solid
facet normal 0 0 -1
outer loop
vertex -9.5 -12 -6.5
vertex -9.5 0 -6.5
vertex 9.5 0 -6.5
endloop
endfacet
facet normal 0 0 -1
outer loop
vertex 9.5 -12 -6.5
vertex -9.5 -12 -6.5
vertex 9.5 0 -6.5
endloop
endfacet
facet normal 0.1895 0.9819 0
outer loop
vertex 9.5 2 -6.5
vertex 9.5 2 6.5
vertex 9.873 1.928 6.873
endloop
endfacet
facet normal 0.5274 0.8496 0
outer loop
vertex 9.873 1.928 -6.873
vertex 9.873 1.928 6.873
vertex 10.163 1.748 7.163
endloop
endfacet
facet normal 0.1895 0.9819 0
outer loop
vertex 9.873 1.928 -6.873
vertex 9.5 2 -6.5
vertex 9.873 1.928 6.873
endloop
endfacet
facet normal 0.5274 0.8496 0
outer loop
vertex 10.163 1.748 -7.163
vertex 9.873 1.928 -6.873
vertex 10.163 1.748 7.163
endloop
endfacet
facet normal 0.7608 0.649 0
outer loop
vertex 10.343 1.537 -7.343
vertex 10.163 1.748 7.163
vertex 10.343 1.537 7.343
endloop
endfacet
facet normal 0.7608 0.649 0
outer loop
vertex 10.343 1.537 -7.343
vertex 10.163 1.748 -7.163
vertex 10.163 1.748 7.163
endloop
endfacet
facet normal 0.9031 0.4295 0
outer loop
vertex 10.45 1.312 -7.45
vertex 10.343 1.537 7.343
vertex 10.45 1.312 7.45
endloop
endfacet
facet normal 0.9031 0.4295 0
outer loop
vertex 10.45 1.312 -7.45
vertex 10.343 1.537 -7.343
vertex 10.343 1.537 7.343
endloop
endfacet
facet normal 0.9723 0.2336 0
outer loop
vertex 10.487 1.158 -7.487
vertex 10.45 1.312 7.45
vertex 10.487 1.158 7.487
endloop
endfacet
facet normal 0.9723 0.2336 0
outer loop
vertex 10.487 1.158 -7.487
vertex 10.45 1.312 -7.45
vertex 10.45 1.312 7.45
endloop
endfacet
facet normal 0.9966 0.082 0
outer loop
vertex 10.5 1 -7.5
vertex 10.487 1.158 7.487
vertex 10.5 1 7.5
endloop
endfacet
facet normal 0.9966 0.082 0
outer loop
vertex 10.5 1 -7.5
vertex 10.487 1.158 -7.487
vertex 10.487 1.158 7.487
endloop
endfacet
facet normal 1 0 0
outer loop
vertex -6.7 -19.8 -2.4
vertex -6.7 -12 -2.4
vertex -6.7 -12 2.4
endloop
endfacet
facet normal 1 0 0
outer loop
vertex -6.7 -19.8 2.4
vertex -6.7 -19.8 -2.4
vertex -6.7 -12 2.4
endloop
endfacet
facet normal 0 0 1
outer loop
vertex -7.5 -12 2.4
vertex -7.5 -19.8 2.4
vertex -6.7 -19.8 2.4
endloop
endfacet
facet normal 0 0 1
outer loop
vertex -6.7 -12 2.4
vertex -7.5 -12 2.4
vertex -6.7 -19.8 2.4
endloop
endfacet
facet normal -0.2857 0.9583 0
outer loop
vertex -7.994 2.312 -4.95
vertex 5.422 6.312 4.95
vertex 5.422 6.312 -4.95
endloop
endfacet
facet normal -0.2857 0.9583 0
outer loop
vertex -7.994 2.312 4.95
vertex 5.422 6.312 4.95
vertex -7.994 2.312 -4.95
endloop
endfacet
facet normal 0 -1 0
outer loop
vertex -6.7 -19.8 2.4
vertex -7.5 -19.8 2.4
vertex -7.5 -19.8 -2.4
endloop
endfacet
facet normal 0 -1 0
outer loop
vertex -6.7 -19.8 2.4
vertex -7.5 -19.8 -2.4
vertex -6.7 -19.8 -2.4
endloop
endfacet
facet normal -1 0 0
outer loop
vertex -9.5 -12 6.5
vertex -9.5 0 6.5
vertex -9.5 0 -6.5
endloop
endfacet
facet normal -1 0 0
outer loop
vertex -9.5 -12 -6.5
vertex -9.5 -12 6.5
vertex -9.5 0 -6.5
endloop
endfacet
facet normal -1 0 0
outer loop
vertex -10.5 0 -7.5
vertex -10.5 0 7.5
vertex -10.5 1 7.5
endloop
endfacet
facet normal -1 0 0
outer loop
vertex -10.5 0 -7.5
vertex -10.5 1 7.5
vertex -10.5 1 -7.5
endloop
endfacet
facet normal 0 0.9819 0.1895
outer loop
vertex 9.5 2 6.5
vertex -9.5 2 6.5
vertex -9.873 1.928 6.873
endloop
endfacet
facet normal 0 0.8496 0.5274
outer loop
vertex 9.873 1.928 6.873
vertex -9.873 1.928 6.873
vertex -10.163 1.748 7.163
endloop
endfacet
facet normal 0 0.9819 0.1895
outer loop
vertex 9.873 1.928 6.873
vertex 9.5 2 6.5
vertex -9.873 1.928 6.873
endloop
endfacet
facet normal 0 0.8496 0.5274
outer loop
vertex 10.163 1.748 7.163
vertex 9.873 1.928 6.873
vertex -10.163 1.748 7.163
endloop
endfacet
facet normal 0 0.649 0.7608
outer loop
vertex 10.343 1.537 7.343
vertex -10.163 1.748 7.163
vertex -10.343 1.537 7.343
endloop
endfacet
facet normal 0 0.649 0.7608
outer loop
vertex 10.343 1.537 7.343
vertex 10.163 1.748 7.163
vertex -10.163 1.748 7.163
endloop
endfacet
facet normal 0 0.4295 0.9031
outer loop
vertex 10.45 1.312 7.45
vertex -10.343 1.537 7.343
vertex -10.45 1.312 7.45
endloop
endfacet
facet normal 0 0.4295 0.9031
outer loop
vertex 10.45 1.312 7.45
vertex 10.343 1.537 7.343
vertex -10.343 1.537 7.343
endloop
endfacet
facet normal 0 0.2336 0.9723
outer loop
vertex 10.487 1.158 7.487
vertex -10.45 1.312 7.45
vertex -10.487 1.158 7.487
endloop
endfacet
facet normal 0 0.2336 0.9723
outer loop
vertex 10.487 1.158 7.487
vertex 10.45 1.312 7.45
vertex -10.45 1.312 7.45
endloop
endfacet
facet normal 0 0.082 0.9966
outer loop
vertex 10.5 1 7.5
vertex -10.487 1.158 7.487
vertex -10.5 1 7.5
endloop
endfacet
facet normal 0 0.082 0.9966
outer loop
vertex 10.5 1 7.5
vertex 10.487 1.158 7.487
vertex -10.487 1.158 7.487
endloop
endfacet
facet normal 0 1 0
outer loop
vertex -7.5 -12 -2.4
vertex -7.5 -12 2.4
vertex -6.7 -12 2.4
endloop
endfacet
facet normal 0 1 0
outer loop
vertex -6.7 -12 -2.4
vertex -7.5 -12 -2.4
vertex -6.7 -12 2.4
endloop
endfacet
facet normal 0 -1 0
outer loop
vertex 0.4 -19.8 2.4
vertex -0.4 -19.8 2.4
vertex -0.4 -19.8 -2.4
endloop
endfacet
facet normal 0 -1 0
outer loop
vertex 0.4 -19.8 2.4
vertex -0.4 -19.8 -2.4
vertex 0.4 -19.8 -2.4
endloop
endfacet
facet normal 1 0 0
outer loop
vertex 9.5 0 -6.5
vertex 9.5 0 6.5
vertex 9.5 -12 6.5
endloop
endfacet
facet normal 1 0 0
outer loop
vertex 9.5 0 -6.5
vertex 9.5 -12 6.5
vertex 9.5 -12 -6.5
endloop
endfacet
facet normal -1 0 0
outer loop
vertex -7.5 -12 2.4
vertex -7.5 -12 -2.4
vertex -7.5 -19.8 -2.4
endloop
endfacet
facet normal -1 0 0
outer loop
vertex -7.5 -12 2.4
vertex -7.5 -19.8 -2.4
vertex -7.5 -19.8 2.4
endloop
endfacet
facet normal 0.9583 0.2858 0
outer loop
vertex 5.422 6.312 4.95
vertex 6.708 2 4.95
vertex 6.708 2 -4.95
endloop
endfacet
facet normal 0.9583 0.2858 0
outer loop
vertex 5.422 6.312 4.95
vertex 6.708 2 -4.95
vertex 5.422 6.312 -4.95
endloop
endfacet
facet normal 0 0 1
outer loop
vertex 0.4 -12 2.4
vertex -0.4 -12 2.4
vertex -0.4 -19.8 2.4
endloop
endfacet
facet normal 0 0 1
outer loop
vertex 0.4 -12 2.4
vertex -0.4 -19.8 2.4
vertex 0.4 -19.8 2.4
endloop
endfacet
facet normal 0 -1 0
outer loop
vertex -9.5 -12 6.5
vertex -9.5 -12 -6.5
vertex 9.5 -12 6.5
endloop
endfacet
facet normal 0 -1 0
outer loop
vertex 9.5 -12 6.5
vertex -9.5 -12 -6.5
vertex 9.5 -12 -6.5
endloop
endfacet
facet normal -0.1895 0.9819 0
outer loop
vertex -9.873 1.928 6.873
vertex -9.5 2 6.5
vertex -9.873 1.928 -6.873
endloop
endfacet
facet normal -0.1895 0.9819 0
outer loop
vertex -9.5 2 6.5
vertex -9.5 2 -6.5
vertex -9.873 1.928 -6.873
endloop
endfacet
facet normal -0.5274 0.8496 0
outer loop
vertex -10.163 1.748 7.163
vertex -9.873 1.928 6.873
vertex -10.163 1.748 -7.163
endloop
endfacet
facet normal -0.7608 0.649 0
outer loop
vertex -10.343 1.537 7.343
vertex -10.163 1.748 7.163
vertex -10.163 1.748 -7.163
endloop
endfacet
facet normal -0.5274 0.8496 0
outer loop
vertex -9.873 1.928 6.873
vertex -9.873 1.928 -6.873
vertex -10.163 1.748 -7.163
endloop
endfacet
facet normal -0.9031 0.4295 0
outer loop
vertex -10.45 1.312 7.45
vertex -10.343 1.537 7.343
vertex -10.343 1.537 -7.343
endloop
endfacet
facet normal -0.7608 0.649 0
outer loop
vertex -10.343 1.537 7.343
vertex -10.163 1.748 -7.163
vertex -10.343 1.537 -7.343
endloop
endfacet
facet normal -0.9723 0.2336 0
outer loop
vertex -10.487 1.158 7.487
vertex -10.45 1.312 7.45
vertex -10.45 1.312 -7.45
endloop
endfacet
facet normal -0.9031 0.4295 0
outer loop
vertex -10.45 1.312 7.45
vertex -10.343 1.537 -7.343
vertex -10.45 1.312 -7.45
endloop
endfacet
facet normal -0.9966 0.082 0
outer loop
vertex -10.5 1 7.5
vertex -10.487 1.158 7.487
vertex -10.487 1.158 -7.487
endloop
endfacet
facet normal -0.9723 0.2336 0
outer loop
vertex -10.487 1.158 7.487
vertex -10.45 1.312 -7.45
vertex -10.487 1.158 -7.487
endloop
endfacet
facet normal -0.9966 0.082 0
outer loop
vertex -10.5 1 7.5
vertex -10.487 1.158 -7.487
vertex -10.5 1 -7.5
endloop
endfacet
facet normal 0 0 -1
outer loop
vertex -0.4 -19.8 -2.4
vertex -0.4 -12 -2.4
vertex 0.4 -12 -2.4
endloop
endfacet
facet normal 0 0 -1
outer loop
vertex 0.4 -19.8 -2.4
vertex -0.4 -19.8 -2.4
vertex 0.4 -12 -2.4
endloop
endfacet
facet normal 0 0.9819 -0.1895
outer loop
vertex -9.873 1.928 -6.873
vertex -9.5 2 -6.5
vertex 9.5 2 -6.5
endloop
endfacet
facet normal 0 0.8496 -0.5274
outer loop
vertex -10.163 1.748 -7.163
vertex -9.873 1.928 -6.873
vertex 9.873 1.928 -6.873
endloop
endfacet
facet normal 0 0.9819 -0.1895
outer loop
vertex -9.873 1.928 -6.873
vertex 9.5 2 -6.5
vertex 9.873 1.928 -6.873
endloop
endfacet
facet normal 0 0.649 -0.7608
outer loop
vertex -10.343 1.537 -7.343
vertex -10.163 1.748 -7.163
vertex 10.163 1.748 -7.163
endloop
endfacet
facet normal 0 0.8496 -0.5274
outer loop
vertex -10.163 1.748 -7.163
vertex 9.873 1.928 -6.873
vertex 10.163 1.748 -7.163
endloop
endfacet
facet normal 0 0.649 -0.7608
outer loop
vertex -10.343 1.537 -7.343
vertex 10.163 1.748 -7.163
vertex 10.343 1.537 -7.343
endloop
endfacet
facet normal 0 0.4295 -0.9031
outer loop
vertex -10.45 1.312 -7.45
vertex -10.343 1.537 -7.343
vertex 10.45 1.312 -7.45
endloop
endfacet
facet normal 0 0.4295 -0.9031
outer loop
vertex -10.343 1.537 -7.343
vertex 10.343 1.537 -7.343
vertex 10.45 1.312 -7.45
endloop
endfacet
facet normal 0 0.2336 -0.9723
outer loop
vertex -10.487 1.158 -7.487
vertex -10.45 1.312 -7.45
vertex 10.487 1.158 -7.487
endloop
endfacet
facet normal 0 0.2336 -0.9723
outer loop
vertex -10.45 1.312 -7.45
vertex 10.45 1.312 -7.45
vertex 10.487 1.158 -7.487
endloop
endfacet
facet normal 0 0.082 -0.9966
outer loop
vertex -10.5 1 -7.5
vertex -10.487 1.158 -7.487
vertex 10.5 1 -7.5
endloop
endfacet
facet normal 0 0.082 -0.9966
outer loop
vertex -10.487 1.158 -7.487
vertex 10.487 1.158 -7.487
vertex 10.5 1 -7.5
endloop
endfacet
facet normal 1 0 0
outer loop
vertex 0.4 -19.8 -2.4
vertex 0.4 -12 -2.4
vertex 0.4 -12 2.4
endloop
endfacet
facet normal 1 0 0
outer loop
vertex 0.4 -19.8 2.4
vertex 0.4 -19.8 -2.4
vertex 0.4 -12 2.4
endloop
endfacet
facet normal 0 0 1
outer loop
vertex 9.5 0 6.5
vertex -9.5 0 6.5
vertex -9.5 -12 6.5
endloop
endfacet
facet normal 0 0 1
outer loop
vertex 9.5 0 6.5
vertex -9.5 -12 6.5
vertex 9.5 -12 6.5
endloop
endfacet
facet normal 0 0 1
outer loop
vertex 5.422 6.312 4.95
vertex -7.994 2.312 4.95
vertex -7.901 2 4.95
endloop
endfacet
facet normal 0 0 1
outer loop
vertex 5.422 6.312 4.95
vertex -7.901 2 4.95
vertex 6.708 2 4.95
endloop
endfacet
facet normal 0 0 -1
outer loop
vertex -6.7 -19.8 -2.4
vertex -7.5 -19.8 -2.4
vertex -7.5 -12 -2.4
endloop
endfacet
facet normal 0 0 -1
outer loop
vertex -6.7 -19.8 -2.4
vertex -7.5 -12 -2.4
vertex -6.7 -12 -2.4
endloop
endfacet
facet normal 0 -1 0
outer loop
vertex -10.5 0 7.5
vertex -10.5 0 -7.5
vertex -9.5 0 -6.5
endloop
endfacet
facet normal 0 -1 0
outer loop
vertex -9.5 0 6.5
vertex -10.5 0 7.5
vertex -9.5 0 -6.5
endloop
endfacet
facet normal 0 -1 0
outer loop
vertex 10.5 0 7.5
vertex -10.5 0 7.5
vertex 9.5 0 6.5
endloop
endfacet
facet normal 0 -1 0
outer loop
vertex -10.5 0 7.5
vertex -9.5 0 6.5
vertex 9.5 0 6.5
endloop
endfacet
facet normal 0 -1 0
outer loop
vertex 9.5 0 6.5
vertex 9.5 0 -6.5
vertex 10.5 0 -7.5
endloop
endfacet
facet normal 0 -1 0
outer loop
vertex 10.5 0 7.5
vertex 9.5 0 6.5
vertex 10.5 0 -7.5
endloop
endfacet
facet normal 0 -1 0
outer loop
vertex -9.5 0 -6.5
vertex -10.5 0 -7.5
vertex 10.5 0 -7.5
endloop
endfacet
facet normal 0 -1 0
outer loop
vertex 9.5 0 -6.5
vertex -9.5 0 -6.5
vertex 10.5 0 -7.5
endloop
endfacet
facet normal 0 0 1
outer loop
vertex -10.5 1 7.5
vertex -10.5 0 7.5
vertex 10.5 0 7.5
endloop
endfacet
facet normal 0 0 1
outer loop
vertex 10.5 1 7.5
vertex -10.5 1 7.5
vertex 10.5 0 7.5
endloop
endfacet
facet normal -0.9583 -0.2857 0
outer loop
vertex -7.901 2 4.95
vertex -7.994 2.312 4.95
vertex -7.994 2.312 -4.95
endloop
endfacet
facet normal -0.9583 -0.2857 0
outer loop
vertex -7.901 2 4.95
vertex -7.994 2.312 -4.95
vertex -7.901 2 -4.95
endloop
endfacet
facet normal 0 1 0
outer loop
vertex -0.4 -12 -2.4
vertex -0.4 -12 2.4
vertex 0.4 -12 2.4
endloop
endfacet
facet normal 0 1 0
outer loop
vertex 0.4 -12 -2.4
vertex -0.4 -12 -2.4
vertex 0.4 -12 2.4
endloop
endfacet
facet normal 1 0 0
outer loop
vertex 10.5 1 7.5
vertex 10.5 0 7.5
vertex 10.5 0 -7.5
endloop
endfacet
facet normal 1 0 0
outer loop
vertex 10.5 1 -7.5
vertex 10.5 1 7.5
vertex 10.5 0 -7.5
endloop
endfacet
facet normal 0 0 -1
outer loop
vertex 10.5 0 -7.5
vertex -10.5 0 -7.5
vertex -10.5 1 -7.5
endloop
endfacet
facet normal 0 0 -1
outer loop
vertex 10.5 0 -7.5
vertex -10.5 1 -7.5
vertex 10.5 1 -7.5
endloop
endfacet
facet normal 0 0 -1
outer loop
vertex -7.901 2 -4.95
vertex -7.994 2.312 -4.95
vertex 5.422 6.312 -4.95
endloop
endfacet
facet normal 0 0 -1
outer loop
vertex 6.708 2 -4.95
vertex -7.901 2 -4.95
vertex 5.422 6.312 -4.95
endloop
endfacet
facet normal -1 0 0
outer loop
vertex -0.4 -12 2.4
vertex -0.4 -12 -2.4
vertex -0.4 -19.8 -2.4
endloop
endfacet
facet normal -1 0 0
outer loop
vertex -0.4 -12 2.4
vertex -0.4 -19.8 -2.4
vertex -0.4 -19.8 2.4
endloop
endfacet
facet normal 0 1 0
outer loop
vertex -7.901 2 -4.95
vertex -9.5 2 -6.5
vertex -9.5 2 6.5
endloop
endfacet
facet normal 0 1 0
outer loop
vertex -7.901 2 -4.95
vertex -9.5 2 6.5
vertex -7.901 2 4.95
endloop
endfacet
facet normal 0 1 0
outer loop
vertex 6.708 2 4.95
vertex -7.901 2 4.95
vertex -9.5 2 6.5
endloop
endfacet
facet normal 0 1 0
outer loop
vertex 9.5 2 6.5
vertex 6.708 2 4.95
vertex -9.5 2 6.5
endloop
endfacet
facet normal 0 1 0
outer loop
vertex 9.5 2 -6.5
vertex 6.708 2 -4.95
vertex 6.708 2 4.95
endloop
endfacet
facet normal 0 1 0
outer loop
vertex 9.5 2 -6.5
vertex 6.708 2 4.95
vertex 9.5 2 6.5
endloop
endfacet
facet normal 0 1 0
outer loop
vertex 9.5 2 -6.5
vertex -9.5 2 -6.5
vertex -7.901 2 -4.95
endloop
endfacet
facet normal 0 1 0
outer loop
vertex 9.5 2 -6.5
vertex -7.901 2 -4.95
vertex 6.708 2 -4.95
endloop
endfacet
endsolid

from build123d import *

# Parameters (mm, degrees)
ESQUISSE1_W          = 21
ESQUISSE1_H          = 15
BOSS_EXTRU_1_DEPTH   = 2
ESQUISSE2_W          = 19
ESQUISSE2_H          = 13
BOSS_EXTRU_2_DEPTH   = 14
ESQUISSE3_W          = 0.8
ESQUISSE3_H          = 4.8
BOSS_EXTRU_3_DEPTH   = 7.8
BOSS_EXTRU_3_2_DEPTH = 7.8
CONG_1_R             = 1
BOSS_EXTRU_4_DEPTH   = 4.95


with BuildPart() as part:
    # Esquisse1 → Boss.-Extru.1 (new body)
    with BuildSketch(Plane(origin=(0, 0, 0), x_dir=(1, 0, 0), z_dir=(0, 1, 0))):
        Rectangle(ESQUISSE1_W, ESQUISSE1_H)
    extrude(amount=BOSS_EXTRU_1_DEPTH)

    # Esquisse2 → Boss.-Extru.2 (add)
    with BuildSketch(Plane(origin=(0, 2, 0), x_dir=(1, 0, 0), z_dir=(0, 1, 0))):
        Rectangle(ESQUISSE2_W, ESQUISSE2_H)
    extrude(amount=-BOSS_EXTRU_2_DEPTH)

    # Congé1
    cong_1_edges = [part.edges().sort_by_distance(p)[0] for p in [
        (-10.5, 2, 0),
        (0, 2, 7.5),
        (10.5, 2, 0),
        (0, 2, -7.5),
    ]]
    fillet(cong_1_edges, radius=CONG_1_R)

    # Esquisse4 → Boss.-Extru.4 (add, symmetric)
    with BuildSketch(Plane.XY):
        Polygon((-7.993918218, 2.312416814), (-6.708203932, -2), (6.708203932, 2), (5.422489647, 6.312416814), align=None)
    extrude(amount=BOSS_EXTRU_4_DEPTH, both=True)


with BuildPart() as body_2:
    # Esquisse3 → Boss.-Extru.3 (new body)
    with BuildSketch(Plane.XZ.offset(12)):
        with Locations((-7.1, 0)):
            Rectangle(ESQUISSE3_W, ESQUISSE3_H)
    extrude(amount=BOSS_EXTRU_3_DEPTH)


with BuildPart() as body_3:
    # Esquisse3 → Boss.-Extru.3 2 (new body)
    with BuildSketch(Plane.XZ.offset(12)):
        Rectangle(ESQUISSE3_W, ESQUISSE3_H)
    extrude(amount=BOSS_EXTRU_3_2_DEPTH)


solid = Compound([part.part, body_2.part, body_3.part])
